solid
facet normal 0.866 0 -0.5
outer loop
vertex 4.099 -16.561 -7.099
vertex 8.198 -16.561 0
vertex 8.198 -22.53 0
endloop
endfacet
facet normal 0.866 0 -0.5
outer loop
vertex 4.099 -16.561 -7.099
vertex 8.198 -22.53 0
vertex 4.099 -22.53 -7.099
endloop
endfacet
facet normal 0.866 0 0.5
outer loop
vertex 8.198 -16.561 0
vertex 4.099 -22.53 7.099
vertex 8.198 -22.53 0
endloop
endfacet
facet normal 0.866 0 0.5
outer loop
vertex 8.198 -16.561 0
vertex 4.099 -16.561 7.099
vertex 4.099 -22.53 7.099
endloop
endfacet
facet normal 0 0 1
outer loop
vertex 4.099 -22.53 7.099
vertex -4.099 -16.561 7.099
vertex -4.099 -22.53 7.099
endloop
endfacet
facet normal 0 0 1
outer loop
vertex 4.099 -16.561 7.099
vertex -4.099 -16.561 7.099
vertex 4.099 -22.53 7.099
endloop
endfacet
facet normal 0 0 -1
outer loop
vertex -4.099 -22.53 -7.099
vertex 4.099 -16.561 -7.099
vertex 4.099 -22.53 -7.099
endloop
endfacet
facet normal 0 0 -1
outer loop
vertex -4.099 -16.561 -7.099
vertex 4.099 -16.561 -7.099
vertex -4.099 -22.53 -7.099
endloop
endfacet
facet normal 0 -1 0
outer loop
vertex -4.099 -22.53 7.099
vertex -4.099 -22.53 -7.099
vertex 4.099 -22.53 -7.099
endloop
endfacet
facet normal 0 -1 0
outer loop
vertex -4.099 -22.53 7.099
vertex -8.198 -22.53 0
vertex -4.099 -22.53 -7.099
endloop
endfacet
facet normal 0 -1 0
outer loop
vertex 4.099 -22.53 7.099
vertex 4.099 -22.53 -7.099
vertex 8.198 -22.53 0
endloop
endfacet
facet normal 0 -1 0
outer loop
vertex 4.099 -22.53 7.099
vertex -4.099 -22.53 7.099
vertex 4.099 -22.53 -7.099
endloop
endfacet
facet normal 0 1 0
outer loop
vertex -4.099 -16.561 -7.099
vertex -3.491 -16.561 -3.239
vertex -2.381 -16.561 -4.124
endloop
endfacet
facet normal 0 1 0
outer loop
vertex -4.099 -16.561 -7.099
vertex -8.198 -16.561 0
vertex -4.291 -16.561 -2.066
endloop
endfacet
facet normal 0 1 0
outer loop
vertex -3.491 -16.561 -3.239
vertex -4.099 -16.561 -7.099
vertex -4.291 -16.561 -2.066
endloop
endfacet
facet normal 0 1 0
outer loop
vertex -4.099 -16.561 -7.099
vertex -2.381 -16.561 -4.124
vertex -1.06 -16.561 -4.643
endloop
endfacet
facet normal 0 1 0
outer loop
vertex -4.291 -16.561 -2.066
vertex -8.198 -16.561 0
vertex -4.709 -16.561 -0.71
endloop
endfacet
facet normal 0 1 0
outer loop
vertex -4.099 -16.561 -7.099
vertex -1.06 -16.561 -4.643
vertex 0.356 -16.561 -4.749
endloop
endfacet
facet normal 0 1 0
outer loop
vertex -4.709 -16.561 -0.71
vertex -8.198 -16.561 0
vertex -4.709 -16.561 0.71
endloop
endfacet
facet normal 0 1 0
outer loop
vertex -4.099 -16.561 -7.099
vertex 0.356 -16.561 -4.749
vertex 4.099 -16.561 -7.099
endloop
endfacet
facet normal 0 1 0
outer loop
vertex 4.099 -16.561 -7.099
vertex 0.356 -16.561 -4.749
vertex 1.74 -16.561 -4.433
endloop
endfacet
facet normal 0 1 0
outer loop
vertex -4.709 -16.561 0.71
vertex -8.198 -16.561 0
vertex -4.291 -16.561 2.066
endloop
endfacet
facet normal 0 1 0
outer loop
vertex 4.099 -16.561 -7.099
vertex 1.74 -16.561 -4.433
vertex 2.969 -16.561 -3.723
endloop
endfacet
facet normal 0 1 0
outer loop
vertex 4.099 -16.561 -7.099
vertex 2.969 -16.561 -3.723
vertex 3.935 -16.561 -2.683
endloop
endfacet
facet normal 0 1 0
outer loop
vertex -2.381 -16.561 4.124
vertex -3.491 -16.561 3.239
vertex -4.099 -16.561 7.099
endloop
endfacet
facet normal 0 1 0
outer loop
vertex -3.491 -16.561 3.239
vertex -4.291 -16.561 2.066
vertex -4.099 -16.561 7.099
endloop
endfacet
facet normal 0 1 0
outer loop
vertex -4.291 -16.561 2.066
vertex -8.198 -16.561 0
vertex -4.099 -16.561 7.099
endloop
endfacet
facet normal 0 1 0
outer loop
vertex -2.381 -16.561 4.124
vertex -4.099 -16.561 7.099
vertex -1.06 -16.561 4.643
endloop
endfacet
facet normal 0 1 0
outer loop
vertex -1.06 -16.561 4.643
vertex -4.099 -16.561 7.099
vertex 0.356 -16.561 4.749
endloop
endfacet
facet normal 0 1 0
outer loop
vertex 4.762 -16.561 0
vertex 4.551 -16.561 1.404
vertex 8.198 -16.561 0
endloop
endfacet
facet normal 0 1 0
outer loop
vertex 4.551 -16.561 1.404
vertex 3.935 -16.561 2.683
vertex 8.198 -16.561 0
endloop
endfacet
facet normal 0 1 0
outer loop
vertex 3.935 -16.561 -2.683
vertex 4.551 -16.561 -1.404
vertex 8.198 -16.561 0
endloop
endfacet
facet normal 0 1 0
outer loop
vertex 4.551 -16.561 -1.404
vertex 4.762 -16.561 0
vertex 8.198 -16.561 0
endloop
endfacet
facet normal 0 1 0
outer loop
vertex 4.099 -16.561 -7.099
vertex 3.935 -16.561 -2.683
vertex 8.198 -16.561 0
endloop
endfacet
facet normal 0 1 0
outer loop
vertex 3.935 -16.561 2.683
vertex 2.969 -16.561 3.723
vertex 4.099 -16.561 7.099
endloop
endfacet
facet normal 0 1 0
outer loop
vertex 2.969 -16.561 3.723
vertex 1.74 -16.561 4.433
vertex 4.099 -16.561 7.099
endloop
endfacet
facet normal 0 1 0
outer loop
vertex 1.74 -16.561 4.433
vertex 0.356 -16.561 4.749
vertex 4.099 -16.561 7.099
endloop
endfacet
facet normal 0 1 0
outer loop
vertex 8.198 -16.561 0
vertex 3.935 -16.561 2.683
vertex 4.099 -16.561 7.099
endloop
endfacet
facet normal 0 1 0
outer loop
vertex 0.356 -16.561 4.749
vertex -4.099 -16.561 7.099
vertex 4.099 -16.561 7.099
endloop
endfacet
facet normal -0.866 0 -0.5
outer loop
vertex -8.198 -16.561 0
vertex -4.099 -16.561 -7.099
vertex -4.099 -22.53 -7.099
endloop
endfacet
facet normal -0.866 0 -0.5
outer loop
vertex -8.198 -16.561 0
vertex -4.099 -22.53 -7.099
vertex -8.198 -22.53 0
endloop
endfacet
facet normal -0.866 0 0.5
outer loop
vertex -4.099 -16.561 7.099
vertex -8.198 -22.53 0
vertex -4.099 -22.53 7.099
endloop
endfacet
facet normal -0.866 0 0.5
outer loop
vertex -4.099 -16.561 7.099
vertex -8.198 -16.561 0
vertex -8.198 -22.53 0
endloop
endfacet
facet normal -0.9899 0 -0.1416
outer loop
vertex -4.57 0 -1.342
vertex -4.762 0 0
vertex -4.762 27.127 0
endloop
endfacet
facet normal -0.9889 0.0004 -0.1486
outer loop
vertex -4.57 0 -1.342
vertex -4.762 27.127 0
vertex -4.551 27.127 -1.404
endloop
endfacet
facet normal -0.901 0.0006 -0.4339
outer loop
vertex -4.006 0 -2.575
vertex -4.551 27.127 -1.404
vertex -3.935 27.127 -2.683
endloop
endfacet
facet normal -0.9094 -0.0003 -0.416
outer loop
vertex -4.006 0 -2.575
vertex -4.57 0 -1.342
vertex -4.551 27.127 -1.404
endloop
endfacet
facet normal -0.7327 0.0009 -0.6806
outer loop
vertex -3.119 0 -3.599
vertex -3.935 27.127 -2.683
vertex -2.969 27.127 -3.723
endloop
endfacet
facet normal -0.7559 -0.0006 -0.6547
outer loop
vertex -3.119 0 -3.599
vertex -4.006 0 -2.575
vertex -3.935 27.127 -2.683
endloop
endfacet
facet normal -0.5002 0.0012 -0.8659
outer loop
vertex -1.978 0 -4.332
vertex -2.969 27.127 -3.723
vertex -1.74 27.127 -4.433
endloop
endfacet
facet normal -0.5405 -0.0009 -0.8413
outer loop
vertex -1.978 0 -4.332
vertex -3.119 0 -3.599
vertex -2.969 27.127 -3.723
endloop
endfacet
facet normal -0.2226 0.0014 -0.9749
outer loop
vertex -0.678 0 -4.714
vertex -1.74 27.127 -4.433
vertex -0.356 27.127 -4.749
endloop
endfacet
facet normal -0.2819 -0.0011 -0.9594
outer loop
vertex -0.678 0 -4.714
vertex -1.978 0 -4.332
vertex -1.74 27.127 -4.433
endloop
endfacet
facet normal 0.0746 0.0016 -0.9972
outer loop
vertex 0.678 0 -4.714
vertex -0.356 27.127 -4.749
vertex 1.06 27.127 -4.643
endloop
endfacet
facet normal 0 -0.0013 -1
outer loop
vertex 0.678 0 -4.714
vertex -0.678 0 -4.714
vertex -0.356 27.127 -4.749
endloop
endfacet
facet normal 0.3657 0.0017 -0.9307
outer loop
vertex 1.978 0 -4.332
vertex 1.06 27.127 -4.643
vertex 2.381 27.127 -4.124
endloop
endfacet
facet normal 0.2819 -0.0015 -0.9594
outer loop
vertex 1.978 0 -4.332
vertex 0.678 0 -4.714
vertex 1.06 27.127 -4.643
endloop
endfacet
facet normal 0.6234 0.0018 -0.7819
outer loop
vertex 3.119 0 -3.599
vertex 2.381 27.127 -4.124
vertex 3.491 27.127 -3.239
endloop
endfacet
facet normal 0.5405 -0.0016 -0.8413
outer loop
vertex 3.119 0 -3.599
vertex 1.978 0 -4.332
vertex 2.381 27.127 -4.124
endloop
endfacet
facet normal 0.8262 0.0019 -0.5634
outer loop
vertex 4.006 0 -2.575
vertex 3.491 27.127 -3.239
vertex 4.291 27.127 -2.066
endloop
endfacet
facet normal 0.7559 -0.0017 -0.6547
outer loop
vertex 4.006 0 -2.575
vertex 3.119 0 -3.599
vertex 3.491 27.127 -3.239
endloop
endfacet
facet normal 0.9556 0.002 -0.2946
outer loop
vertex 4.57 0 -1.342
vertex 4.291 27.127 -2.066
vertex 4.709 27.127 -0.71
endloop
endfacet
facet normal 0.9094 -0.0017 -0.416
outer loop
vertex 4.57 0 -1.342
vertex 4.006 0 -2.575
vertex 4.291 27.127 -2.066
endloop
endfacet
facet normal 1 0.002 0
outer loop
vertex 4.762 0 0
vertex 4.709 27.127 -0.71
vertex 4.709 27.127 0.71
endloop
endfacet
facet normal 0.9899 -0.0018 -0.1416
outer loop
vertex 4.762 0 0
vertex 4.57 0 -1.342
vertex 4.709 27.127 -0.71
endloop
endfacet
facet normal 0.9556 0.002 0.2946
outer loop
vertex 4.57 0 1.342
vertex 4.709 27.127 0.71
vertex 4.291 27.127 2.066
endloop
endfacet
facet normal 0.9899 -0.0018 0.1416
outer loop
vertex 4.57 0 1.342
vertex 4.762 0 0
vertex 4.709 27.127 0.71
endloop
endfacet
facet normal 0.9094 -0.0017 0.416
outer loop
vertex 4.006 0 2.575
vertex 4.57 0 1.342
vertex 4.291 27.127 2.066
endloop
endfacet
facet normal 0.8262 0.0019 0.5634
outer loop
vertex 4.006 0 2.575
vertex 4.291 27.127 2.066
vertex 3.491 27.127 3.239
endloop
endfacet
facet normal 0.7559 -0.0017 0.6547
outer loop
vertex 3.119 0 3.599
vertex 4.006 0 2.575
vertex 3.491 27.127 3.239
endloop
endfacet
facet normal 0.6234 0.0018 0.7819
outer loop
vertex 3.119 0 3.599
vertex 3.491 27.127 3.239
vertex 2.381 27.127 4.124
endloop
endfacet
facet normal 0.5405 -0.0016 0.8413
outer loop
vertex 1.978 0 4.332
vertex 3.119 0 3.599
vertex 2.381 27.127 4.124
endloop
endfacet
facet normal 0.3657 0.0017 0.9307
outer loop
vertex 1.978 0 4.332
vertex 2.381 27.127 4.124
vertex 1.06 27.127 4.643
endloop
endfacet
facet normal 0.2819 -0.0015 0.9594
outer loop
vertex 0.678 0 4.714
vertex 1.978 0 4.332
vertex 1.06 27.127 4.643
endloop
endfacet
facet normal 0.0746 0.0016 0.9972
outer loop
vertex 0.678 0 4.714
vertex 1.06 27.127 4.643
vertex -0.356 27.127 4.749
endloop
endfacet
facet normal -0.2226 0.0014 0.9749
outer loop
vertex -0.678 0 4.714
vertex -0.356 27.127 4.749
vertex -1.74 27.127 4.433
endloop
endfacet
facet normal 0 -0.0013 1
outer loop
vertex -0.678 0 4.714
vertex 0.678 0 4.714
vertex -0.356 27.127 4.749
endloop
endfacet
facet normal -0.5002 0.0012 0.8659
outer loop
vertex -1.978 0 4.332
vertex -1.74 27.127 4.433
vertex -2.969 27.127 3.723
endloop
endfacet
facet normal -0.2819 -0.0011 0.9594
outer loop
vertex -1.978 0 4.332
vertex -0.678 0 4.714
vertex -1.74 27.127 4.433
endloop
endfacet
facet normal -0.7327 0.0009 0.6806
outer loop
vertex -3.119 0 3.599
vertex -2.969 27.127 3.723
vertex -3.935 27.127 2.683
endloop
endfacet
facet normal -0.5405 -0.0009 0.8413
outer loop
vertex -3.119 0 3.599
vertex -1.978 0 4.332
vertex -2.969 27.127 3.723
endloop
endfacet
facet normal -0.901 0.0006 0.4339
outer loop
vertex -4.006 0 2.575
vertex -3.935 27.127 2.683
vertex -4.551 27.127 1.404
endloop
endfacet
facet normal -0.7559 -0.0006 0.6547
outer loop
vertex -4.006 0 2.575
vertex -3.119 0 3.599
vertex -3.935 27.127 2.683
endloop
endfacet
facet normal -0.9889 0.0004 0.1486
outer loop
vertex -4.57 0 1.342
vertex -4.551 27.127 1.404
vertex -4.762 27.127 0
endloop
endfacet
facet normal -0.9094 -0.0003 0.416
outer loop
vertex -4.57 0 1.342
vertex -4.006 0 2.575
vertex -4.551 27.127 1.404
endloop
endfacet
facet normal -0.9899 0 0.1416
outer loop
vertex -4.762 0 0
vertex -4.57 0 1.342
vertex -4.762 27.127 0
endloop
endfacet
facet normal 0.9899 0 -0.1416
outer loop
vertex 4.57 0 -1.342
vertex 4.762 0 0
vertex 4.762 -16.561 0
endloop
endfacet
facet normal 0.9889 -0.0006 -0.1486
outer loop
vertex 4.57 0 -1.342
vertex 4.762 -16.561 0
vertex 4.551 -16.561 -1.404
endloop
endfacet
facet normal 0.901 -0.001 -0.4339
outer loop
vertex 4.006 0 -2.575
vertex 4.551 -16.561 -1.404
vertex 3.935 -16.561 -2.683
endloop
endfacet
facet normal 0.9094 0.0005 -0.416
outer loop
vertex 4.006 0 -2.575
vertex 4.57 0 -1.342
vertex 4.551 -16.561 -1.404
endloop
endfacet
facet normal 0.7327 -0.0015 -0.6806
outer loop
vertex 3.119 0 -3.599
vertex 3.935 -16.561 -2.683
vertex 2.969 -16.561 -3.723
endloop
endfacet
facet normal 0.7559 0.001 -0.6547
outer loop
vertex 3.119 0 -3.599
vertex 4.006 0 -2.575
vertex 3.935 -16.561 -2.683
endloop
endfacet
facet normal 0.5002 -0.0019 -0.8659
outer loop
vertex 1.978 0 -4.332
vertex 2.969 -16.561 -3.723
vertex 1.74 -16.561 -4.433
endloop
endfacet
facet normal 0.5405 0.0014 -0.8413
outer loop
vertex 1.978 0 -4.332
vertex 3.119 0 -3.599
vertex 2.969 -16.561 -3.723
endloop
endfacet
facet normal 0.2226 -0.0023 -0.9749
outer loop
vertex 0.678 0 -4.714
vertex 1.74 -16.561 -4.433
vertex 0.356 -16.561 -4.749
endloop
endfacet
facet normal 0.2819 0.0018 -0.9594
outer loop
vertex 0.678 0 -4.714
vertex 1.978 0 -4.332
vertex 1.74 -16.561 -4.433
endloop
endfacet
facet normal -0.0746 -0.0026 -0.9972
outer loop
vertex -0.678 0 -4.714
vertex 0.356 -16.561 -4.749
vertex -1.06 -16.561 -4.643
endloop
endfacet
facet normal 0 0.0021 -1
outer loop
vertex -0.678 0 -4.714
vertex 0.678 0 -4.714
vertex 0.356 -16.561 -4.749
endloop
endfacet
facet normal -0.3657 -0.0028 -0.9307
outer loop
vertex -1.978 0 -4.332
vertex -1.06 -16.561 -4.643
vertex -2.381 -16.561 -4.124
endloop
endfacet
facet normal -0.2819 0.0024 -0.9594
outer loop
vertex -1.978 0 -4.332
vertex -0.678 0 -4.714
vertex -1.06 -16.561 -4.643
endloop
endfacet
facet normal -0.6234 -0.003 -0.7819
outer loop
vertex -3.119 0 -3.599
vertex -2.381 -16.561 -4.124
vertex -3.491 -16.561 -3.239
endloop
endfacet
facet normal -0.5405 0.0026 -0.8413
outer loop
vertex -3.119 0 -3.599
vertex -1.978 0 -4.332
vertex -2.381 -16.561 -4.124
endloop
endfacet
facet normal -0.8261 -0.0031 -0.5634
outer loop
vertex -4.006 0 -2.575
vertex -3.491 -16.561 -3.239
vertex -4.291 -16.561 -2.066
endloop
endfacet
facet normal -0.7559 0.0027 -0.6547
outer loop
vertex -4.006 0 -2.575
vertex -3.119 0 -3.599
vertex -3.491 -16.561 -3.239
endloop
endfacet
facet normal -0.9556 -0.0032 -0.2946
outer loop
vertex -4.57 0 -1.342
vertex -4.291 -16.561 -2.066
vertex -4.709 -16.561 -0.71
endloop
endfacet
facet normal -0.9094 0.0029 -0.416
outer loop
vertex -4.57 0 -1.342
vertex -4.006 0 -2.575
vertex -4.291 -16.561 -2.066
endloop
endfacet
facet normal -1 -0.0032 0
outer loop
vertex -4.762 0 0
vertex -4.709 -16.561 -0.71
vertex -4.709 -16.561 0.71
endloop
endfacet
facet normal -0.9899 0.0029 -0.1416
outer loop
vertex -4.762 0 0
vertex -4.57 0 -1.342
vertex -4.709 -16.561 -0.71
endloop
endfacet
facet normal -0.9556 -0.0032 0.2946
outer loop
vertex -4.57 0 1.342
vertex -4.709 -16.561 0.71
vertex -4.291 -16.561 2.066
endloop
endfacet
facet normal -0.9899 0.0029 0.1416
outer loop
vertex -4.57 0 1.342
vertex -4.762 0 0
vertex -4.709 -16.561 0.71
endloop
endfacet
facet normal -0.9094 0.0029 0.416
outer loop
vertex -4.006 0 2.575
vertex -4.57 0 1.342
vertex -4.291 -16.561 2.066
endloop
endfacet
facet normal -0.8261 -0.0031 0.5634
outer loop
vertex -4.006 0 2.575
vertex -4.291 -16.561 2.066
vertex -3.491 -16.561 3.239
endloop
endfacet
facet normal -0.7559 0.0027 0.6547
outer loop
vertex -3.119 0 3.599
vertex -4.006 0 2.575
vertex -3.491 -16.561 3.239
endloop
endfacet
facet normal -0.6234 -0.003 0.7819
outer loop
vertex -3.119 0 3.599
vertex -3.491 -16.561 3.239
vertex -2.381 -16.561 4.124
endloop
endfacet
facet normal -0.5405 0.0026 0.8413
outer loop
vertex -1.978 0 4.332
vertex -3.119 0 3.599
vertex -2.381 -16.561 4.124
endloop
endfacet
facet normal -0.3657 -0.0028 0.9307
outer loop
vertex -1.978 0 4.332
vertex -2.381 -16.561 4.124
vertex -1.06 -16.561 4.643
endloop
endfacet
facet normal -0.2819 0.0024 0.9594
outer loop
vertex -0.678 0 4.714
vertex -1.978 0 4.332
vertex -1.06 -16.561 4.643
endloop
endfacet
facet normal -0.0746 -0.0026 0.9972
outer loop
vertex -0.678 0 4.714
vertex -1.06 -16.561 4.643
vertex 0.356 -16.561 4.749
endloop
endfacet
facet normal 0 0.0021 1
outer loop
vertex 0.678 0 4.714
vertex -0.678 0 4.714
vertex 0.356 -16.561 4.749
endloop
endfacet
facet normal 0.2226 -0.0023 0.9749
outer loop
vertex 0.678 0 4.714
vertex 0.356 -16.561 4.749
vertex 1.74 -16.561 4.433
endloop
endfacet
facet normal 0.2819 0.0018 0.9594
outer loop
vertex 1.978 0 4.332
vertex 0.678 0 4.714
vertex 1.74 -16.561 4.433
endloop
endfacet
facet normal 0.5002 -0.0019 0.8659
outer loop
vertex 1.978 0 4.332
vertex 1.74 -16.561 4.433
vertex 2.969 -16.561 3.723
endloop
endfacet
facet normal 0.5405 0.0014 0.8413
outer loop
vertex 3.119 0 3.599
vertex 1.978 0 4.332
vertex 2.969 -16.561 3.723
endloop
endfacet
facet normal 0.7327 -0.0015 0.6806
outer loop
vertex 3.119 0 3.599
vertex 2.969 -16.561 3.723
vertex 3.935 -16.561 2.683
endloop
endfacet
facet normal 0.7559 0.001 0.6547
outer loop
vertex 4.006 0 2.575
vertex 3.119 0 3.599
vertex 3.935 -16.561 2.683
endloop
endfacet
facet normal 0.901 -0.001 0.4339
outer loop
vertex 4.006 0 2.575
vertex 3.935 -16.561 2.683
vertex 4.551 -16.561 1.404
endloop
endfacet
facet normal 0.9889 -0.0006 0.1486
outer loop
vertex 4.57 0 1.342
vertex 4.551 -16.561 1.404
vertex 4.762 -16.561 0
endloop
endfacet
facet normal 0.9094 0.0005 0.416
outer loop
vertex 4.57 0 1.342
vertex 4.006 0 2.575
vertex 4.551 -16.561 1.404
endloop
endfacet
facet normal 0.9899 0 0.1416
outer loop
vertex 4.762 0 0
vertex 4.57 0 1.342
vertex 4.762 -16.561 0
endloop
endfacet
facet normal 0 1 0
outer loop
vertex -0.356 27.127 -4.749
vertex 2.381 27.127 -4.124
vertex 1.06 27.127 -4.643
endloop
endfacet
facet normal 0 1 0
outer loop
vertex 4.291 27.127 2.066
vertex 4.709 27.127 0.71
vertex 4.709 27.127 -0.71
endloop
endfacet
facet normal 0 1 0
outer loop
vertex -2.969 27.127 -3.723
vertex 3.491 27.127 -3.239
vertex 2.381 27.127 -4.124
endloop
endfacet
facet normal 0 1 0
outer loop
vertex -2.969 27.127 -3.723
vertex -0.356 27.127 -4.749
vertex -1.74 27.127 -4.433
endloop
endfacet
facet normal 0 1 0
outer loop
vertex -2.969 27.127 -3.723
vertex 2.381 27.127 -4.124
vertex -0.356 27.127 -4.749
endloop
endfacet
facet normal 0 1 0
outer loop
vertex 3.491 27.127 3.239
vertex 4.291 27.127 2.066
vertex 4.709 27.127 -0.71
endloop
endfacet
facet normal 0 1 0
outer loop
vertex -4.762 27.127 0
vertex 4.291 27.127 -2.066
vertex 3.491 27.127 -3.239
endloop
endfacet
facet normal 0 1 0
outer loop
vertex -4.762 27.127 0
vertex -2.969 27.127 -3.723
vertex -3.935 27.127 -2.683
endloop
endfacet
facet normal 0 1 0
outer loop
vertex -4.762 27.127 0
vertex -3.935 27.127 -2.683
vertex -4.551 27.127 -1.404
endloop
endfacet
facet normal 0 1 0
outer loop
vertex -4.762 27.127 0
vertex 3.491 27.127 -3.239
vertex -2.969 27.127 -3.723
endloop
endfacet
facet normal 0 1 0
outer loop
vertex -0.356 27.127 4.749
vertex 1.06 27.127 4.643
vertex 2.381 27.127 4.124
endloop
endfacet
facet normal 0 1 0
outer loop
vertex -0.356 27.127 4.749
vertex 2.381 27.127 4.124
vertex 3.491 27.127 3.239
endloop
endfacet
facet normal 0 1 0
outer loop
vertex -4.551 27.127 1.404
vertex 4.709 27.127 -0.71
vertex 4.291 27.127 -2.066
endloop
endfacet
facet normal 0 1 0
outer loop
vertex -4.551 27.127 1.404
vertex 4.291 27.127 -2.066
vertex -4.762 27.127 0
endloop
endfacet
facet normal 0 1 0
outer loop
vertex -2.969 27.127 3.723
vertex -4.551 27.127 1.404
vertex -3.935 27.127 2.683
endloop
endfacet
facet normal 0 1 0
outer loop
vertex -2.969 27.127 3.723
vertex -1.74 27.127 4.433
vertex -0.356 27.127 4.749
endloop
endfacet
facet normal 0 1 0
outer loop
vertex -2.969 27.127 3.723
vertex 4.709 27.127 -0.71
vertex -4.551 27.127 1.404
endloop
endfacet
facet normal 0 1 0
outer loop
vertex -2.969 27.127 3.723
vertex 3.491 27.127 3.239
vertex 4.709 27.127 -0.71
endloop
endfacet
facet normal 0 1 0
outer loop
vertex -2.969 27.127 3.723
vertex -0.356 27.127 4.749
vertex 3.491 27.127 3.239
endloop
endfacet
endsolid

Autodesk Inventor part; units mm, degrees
ref_plane "YZ Plane" through (0, 0, 0) normal (1, 0, 0) x (0, 1, 0)
ref_plane "XZ Plane" through (0, 0, 0) normal (0, 1, 0) x (-1, 0, 0)
ref_plane "XY Plane" through (0, 0, 0) normal (0, 0, 1) x (1, 0, 0)
sketch "Sketch1" plane through (0, 0, 0) normal (0, 1, 0) x (-1, 0, 0)
  circle A0 centre (0, 0) radius 4.7625
  dimension "d0" = 9.525
extrude "Extrusion1" add sketch "Sketch1" along normal blind 27.1272
thread "Thread1" size "3/8-16 UNC" class "2A" standard "ANSI Unified Screw Threads" length 25.4
sketch "Sketch2" plane through (0, 0, 0) normal (0, -1, 0) x (1, 0, 0)
  circle A0 centre (0, 0) radius 4.7625
extrude "Extrusion2" add sketch "Sketch2" along normal blind 16.5608
sketch "Sketch3" plane through (0, -16.5608, 0) normal (0, -1, 0) x (1, 0, 0)
  circle A0 centre (0, 0) radius 4.7625 projected
  line L0 (-4.0988, -7.0993) -> (-8.1976, 0)
  line L1 (-8.1976, 0) -> (-4.0988, 7.0993)
  line L2 (-4.0988, 7.0993) -> (4.0988, 7.0993)
  line L3 (4.0988, 7.0993) -> (8.1976, 0)
  line L4 (8.1976, 0) -> (4.0988, -7.0993)
  line L5 (4.0988, -7.0993) -> (-4.0988, -7.0993)
  dimension "d9" = 14.1986
  dimension "d10" = 14.1986
extrude "Extrusion3" add sketch "Sketch3" along normal blind 5.969 contours A0 | L0 L1 L2 L3 L4 L5
properties part number "3 8t 1 1 2 bolt"
